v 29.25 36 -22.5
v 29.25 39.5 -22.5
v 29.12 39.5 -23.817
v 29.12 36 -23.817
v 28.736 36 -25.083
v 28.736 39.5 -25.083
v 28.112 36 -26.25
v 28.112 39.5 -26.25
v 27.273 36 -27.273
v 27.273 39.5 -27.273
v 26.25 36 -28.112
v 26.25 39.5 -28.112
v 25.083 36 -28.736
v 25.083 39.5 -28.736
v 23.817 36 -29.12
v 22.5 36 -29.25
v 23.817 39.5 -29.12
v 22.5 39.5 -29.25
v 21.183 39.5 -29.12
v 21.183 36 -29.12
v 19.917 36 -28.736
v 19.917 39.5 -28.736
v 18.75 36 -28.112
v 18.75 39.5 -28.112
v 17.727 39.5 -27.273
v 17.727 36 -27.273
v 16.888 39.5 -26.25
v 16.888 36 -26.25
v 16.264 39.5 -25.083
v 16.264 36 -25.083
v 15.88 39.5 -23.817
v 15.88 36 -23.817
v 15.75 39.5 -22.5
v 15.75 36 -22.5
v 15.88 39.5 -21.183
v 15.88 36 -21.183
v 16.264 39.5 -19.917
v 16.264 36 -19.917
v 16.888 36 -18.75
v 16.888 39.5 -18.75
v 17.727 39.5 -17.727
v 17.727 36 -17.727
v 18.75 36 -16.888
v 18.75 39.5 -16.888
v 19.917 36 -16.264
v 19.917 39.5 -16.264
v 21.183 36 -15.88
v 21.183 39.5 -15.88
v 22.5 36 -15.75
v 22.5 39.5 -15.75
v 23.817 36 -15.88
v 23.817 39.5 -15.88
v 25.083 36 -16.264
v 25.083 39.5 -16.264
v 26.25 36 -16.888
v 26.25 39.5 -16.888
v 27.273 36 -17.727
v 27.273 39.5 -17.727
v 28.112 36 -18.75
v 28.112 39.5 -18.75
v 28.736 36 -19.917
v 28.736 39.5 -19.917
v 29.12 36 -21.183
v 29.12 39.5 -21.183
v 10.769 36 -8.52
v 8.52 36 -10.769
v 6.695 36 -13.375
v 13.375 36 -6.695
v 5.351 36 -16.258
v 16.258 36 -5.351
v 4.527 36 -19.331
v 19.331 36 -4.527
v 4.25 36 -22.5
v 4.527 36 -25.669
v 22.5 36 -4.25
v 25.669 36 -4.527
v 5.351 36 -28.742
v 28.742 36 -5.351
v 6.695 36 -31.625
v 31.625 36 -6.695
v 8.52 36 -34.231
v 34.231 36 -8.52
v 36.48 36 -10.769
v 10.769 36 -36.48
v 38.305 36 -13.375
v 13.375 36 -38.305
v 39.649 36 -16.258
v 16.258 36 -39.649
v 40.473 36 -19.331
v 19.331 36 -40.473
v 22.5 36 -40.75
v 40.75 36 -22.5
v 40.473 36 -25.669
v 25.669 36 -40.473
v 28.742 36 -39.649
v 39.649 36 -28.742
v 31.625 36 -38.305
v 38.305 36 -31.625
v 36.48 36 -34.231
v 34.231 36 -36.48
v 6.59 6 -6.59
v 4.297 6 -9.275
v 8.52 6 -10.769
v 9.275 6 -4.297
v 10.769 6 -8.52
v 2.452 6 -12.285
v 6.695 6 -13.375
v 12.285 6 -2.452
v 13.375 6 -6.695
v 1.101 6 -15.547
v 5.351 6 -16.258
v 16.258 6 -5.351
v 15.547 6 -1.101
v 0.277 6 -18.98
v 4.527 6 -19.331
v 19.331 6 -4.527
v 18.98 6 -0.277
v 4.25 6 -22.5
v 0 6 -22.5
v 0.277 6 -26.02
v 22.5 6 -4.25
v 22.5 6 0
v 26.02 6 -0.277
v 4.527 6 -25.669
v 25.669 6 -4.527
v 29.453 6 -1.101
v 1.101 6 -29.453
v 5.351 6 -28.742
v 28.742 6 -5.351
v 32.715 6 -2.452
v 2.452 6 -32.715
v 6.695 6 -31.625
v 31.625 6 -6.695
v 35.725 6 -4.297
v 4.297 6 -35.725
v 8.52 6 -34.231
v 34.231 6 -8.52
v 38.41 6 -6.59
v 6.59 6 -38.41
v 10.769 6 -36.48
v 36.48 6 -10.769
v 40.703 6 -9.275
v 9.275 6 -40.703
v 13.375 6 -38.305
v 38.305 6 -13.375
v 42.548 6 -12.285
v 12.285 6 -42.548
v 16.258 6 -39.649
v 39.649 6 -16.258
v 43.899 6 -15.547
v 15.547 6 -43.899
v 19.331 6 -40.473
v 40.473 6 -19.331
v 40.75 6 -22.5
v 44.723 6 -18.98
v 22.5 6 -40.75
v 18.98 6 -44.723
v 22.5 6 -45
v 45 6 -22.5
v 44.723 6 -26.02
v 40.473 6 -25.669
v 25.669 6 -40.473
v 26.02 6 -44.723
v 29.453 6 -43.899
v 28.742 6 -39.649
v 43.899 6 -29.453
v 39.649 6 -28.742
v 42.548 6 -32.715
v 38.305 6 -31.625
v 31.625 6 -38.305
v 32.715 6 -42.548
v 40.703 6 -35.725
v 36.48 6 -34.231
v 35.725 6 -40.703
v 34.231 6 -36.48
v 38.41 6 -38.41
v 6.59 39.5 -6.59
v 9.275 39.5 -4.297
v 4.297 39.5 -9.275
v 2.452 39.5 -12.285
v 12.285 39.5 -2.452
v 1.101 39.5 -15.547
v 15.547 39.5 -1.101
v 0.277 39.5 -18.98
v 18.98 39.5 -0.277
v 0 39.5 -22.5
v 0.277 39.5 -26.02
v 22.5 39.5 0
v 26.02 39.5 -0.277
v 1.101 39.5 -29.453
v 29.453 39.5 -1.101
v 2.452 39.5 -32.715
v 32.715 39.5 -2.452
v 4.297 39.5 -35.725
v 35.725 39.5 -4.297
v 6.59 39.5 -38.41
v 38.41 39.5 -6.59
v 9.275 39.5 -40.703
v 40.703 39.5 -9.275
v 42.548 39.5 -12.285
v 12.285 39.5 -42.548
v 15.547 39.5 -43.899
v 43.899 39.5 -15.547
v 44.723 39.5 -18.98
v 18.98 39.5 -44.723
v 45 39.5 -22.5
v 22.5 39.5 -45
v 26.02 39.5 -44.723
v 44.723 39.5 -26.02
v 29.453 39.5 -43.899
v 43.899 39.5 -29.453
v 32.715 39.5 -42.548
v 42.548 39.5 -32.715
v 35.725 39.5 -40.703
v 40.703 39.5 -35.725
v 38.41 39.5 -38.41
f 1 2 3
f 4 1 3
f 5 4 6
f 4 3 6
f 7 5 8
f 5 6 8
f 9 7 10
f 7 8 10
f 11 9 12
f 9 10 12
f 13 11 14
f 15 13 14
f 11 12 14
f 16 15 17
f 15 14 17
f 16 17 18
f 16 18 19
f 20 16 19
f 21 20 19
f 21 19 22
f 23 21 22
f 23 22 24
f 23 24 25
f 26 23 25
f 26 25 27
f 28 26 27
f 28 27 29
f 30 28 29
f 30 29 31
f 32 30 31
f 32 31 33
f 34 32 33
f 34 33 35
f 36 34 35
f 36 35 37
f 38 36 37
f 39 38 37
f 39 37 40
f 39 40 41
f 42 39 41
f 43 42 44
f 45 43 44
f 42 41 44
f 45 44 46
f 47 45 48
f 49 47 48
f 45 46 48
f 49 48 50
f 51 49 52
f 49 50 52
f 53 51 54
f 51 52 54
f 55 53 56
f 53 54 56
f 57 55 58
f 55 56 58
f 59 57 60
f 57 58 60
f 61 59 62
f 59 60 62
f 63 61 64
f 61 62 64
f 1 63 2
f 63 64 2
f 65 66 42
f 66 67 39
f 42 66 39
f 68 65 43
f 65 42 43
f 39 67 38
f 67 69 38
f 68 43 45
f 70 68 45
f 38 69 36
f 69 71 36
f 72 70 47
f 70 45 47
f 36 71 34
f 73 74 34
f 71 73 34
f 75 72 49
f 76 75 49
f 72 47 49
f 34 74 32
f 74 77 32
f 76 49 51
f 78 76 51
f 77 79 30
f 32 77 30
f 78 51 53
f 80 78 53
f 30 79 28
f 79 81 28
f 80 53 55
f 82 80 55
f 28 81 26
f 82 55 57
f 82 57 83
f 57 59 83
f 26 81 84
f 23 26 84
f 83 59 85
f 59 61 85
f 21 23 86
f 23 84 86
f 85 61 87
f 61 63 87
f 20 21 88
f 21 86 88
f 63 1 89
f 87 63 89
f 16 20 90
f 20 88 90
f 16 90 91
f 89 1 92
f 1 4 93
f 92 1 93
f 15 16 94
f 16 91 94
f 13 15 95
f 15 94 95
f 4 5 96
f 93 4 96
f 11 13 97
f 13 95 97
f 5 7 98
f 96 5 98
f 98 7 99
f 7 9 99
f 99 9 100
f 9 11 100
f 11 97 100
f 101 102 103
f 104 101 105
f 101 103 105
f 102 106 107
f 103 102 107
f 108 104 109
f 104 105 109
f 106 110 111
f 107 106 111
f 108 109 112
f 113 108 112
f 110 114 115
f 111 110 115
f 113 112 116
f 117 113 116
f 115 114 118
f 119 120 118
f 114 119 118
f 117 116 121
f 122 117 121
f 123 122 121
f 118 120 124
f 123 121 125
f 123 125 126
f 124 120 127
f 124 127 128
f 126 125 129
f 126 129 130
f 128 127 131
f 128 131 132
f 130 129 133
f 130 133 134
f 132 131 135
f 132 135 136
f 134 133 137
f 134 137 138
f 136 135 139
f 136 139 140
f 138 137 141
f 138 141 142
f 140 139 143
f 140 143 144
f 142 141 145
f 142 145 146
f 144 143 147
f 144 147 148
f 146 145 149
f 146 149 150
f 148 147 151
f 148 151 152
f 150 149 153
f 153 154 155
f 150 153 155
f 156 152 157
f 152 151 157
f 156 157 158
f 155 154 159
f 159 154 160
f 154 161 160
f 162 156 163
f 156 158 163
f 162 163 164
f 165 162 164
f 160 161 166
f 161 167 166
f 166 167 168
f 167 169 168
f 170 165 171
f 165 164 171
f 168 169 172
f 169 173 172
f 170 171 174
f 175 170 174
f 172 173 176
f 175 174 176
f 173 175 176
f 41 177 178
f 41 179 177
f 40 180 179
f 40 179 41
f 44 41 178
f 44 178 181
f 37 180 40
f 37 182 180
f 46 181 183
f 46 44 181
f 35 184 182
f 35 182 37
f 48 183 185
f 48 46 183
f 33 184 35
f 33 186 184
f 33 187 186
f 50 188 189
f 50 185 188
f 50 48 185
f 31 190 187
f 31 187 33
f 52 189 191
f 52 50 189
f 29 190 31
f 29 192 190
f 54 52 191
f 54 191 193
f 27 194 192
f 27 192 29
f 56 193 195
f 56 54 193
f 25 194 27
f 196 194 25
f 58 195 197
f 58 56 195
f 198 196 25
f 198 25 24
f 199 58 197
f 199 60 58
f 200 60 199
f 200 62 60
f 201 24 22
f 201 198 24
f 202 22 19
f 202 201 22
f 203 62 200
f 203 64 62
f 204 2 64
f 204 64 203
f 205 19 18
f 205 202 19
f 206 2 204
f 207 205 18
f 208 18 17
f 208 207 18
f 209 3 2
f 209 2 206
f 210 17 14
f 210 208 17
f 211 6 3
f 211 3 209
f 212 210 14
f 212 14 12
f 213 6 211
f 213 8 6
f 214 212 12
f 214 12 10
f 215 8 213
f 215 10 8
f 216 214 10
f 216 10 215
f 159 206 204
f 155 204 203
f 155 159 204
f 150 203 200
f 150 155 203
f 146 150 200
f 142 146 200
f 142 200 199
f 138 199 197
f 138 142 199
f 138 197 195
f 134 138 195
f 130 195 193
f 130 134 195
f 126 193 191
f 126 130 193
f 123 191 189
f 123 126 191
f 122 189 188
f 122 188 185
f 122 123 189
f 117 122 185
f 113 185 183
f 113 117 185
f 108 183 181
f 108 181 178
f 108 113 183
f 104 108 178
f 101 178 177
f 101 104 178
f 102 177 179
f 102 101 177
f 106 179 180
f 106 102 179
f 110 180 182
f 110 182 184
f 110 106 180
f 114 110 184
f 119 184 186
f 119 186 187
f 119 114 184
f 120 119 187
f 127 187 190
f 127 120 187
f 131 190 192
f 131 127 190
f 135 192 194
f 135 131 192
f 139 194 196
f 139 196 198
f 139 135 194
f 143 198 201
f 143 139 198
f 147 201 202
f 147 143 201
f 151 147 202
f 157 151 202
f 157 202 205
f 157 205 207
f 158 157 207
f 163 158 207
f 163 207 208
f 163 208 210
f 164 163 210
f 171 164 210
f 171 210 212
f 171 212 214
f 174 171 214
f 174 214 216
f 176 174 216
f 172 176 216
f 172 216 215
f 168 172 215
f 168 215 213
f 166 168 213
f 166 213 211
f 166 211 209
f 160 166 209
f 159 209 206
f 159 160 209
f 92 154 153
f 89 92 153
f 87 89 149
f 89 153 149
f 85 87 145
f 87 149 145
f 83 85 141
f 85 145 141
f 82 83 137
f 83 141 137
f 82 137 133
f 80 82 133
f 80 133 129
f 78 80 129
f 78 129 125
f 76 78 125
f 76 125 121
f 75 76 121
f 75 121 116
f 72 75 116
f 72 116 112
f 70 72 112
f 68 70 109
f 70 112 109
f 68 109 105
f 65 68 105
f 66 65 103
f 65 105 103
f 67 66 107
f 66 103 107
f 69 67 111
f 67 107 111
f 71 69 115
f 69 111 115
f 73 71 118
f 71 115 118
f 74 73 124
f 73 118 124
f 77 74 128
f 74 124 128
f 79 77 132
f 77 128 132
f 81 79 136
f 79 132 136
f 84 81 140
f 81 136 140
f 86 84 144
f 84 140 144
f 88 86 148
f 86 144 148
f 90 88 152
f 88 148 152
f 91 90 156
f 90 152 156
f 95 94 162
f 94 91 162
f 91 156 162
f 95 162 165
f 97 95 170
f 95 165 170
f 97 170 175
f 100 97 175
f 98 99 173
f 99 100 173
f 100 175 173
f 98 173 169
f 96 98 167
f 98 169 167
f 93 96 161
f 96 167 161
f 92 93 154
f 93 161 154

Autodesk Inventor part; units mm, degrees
ref_plane "YZ Plane" through (0, 0, 0) normal (1, 0, 0) x (0, 1, 0)
ref_plane "XZ Plane" through (0, 0, 0) normal (0, 1, 0) x (-1, 0, 0)
ref_plane "XY Plane" through (0, 0, 0) normal (0, 0, 1) x (1, 0, 0)
ref_plane "Work Plane3" through (0, 6, 0) normal (0, 1, 0) x (1, 0, 0)
sketch "Sketch2" plane through (0, 6, 0) normal (0, 1, 0) x (1, 0, 0)
  line L0 (0, 0) -> (0, 22.5)
  line L1 (0, 45) -> (0, 0) projected
  line L2 (0, 22.5) -> (22.5, 22.5)
  circle A0 centre (22.5, 22.5) radius 22.5
  dimension "d5" = 22.5
  dimension "d6" = 22.5
  dimension "d7" = 45
extrude "Extrusion2" add sketch "Sketch2" along normal blind 33.5
ref_plane "Work Plane2" through (0, 0, 0) normal (0, -1, 0) x (1, 0, 0)
sketch "Sketch3" plane through (0, 0, 0) normal (0, -1, 0) x (1, 0, 0)
  line L0 (0, -45) -> (0, 0) projected
  line L1 (0, 0) -> (0, -22.5)
  circle A0 centre (22.5, -22.5) radius 18.25
  dimension "d12" = 36.5
extrude "Extrusion3" cut sketch "Sketch3" against normal blind 65
sketch "Sketch4" plane through (22.5, 39.5, -22.5) normal (0, 1, 0) x (1, 0, 0)
  circle A0 centre (0, 0) radius 6.75
  point P0 (-22.5, -22.5)
  dimension "d15" = 13.5
extrude "Extrusion4" cut sketch "Sketch4" against normal blind 4.5
ref_plane "Work Plane1" through (0, 0, 0) normal (0, -1, 0) x (1, 0, 0)
sketch "Sketch5" plane through (0, 0, 0) normal (0, -1, 0) x (1, 0, 0)
  line L0 (0, -45) -> (0, 0) projected
  line L1 (0, 0) -> (22.5, 0)
  line L2 (0, 0) -> (45, 0) projected
sketch "Sketch6" plane through (22.5, 39.5, -22.5) normal (0, 1, 0) x (1, 0, 0)
  point P0 (-22.5, -22.5)
sketch "Sketch7" plane through (22.5, 39.5, -22.5) normal (0, 1, 0) x (1, 0, 0)
  circle A0 centre (0, 0) radius 18.25 projected
  circle A1 centre (0, 0) radius 18.25
  point P0 (-22.5, -22.5)
extrude "Extrusion5" add sketch "Sketch7" against normal blind 3.5
sketch "Sketch8" plane through (22.5, 39.5, -22.5) normal (0, 1, 0) x (1, 0, 0)
  circle A0 centre (0, 0) radius 6.75
  point P0 (-22.5, -22.5)
  dimension "d20" = 13.5
extrude "Extrusion6" cut sketch "Sketch8" against normal blind 3.5
sketch "Sketch9" plane through (22.5, 6, -22.5) normal (0, -1, 0) x (1, 0, 0)
  point P0 (-22.5, 22.5)
sketch "Sketch10" plane through (22.5, 39.5, -22.5) normal (0, 1, 0) x (1, 0, 0)
  point P0 (-22.5, -22.5)
sketch "Sketch11" plane through (22.5, 6, -22.5) normal (0, -1, 0) x (1, 0, 0)
  circle A0 centre (0, 0) radius 22.5 projected
  line L0 (0, 29) -> (32.5, 29)
  line L1 (32.5, 29) -> (32.5, -29)
  line L2 (32.5, -29) -> (-32.5, -29)
  line L3 (0, 29) -> (-32.5, 29)
  point P0 (-22.5, 22.5)
  dimension "d25" = 58
  dimension "d26" = 65
  dimension "d27" = 32.5
